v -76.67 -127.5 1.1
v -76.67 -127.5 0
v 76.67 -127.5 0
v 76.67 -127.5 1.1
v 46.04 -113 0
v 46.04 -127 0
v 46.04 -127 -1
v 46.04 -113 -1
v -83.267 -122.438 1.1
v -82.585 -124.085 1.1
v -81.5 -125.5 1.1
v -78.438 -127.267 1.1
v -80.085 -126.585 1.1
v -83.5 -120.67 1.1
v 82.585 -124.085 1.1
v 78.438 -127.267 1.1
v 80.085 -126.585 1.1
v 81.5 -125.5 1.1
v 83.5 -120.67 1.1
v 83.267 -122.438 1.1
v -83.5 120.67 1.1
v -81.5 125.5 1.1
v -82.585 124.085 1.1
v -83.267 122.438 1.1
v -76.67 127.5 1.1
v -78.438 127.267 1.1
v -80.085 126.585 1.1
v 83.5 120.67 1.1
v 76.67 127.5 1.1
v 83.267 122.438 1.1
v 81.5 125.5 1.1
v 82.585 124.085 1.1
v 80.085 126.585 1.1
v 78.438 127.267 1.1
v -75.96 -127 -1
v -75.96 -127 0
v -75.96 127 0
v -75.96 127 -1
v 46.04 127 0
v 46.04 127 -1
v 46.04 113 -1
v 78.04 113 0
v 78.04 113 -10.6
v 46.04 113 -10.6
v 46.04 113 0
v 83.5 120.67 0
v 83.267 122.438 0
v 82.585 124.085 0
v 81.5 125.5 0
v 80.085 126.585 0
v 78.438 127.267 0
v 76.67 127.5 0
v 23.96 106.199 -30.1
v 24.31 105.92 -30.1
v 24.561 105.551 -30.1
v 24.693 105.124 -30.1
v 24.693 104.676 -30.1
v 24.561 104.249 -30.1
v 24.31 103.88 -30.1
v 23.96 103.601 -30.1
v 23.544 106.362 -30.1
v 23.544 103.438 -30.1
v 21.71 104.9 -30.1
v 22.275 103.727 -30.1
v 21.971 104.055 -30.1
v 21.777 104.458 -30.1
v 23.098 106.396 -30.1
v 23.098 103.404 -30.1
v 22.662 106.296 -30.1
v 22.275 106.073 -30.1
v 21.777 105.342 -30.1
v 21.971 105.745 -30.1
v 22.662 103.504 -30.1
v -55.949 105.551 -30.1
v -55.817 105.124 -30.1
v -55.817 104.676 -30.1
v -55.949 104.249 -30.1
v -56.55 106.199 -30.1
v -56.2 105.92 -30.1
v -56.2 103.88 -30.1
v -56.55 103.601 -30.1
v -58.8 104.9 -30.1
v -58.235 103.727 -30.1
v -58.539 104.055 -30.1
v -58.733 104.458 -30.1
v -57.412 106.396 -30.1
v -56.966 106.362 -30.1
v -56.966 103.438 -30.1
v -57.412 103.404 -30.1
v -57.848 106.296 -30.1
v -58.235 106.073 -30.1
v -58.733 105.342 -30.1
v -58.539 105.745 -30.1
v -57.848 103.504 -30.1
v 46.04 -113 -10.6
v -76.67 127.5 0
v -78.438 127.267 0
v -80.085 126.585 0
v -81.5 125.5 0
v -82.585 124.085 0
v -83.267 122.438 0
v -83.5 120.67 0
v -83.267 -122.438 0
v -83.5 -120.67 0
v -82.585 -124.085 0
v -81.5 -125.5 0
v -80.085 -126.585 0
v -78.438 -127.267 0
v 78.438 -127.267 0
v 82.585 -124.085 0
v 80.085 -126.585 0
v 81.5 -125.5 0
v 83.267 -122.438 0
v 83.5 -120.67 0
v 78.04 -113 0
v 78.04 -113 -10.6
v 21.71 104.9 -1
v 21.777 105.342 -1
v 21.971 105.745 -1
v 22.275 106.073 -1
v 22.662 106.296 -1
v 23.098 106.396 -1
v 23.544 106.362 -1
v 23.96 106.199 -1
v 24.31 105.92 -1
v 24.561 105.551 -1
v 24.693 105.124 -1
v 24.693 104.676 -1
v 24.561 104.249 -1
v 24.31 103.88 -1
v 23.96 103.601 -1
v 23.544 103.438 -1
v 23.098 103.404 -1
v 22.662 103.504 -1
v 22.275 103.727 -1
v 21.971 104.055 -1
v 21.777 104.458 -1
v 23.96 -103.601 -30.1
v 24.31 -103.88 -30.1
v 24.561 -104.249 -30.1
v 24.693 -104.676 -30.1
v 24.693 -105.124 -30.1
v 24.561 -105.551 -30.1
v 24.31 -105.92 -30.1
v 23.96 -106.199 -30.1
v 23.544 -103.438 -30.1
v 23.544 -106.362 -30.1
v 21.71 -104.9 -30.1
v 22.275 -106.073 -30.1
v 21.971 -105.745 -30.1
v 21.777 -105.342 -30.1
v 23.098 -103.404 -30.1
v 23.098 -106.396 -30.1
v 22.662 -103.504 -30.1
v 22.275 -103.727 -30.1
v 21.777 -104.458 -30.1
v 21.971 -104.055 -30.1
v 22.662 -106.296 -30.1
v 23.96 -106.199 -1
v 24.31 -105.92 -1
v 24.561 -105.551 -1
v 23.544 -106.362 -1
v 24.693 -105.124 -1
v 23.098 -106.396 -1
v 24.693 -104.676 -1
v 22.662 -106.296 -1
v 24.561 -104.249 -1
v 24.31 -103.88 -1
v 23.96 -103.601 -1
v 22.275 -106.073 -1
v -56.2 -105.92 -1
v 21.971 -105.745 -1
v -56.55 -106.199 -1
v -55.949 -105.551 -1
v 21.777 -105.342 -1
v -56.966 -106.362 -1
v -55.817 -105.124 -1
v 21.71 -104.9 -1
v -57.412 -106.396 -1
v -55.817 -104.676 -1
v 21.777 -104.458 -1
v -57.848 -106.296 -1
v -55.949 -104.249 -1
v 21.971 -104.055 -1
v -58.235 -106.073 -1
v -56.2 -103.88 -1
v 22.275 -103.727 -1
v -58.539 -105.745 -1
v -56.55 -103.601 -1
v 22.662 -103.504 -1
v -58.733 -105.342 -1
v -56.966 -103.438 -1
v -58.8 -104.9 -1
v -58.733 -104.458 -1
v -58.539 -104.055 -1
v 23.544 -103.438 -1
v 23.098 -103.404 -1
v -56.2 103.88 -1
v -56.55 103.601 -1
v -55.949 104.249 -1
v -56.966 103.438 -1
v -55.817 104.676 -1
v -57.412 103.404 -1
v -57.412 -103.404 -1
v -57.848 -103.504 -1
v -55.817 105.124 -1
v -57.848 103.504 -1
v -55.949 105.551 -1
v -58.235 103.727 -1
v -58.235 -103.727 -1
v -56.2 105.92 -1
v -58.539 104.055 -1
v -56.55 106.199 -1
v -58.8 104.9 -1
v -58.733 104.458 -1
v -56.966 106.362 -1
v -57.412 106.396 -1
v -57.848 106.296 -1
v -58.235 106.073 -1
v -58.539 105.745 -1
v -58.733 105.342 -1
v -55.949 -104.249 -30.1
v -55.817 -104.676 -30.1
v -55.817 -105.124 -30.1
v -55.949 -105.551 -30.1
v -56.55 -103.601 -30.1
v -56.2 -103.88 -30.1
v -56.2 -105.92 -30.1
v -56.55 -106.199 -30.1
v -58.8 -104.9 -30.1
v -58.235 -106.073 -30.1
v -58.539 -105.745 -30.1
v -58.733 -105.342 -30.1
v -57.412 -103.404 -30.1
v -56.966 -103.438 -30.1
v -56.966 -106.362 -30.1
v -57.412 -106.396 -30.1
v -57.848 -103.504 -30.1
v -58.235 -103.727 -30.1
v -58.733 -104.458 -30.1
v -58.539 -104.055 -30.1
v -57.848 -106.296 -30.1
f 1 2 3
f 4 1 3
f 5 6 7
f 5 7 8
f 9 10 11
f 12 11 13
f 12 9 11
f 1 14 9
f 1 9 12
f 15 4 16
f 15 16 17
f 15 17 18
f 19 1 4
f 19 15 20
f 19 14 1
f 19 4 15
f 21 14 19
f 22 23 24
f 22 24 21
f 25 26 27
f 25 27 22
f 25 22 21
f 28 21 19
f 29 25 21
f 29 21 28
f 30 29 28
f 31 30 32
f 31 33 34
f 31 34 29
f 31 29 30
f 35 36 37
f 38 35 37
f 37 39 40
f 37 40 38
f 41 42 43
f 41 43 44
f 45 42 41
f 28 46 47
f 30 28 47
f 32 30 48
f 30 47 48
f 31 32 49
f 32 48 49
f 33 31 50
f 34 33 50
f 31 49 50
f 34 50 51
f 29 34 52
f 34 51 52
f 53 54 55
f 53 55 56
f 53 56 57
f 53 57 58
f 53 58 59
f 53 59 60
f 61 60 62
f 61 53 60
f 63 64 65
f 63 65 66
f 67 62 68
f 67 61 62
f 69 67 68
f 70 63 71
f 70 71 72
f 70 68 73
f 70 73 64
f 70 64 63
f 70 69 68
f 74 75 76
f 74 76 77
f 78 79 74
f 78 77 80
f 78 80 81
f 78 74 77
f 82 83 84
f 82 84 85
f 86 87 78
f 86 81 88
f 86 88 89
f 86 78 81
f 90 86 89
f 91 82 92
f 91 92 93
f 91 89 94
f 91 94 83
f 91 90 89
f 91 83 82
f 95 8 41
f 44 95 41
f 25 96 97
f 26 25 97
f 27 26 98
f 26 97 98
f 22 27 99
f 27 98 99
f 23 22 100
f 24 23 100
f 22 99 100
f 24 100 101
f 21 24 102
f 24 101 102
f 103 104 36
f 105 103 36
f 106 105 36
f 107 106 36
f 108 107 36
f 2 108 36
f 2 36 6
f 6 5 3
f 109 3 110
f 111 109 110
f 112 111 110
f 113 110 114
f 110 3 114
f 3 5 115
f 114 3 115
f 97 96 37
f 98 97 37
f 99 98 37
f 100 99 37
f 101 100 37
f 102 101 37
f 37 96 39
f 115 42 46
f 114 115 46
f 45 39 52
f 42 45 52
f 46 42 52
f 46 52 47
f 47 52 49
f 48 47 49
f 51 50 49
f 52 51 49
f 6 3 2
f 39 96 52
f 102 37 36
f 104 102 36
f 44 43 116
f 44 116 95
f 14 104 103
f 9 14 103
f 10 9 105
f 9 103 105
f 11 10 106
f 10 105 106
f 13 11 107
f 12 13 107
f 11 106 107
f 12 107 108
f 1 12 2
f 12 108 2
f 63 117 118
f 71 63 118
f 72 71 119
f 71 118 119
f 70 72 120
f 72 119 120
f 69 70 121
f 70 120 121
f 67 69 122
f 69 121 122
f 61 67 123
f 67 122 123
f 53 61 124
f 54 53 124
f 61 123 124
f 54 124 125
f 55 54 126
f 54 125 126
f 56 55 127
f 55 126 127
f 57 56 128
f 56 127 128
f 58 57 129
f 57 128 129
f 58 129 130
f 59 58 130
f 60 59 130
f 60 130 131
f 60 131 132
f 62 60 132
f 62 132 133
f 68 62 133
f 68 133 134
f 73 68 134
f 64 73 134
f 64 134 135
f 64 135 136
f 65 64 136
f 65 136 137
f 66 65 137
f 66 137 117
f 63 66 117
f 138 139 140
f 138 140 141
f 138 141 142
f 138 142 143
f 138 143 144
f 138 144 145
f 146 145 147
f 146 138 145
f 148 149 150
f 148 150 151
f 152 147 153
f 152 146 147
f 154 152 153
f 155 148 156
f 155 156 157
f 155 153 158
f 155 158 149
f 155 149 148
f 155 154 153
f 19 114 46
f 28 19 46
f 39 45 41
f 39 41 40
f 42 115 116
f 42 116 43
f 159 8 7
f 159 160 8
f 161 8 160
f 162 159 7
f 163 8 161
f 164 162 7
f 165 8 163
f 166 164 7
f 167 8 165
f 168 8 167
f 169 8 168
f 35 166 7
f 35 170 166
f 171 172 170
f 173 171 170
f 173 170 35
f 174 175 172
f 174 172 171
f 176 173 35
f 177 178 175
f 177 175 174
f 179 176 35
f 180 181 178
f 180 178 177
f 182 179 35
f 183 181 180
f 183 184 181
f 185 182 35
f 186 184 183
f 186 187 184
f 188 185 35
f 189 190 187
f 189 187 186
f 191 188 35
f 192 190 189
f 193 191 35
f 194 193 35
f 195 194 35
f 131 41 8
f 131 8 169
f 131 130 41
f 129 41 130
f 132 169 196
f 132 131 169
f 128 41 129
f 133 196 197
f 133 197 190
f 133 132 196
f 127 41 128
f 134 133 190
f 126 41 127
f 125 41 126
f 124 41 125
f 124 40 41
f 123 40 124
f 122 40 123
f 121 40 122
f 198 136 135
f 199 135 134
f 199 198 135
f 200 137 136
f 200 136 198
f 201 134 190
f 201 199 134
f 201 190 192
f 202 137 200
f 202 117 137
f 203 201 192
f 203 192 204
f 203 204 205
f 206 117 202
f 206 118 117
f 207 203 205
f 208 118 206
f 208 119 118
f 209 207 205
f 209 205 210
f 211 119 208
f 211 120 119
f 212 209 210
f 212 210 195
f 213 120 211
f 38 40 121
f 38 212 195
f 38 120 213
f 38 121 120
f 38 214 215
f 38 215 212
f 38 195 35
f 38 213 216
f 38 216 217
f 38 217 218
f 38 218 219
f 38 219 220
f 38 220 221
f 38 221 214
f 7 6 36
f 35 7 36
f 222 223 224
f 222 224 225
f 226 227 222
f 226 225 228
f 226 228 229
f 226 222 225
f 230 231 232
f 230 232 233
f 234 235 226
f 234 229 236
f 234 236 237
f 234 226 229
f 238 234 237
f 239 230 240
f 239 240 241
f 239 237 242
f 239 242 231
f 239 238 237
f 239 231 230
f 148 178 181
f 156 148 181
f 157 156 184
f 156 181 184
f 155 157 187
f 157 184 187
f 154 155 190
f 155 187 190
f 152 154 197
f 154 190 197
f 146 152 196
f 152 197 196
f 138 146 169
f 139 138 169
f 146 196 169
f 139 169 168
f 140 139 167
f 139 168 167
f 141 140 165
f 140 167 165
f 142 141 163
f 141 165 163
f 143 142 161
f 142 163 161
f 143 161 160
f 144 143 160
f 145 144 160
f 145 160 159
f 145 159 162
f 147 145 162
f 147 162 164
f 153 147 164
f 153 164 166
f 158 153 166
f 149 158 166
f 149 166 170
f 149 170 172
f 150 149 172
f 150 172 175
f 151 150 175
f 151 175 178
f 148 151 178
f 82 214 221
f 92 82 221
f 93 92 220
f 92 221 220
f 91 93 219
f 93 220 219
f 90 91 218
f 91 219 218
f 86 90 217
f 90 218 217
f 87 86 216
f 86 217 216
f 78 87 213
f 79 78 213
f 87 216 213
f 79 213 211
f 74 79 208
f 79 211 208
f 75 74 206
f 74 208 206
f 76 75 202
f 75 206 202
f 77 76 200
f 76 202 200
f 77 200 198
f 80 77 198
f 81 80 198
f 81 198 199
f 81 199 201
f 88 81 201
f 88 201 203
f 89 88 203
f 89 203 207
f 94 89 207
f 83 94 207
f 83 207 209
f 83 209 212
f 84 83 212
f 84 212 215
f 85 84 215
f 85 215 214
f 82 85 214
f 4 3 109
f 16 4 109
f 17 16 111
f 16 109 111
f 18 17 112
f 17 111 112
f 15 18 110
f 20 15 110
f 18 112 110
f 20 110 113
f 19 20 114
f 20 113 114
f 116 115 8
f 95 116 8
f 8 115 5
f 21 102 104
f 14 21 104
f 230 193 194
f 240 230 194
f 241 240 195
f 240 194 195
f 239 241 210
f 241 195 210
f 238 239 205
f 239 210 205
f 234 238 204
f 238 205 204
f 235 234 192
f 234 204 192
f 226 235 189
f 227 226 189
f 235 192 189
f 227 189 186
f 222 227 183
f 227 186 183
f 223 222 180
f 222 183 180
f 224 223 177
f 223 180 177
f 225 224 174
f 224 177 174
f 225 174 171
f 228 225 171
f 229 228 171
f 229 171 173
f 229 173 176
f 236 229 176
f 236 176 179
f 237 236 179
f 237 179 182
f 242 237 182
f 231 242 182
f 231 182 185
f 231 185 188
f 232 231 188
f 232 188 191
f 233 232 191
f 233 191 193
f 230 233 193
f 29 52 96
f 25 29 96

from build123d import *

# Parameters (mm, degrees)
BOSS_EXTRUDE1_DEPTH = 1.1
SKETCH3_W           = 122
SKETCH3_H           = 254
BOSS_EXTRUDE2_DEPTH = 1
SKETCH4_W           = 32
SKETCH4_H           = 226
BOSS_EXTRUDE3_DEPTH = 10.6
SKETCH5_R           = 1.5
BOSS_EXTRUDE4_DEPTH = 30.1


with BuildPart() as part:
    # Sketch2 → Boss-Extrude1 (new body)
    with BuildSketch(Plane.XY):
        with BuildLine():
            Line((-76.67, -127.5), (76.67, -127.5))
            ThreePointArc((76.67, -127.5), (81.499539316, -125.499539316), (83.5, -120.67))
            Line((83.5, -120.67), (83.5, 120.67))
            ThreePointArc((83.5, 120.67), (81.499539316, 125.499539316), (76.67, 127.5))
            Line((76.67, 127.5), (-76.67, 127.5))
            ThreePointArc((-76.67, 127.5), (-81.499539316, 125.499539316), (-83.5, 120.67))
            Line((-83.5, 120.67), (-83.5, -120.67))
            ThreePointArc((-83.5, -120.67), (-81.499539316, -125.499539316), (-76.67, -127.5))
        make_face()
    extrude(amount=BOSS_EXTRUDE1_DEPTH)

    # Sketch3 → Boss-Extrude2 (add)
    with BuildSketch(Plane(origin=(0, 0, 0), x_dir=(-1, 0, 0), z_dir=(0, 0, -1))):
        with Locations((14.96, 0)):
            Rectangle(SKETCH3_W, SKETCH3_H)
    extrude(amount=BOSS_EXTRUDE2_DEPTH)

    # Sketch4 → Boss-Extrude3 (add)
    with BuildSketch(Plane(origin=(0, 0, 0), x_dir=(-1, 0, 0), z_dir=(0, 0, -1))):
        with Locations((-62.04, 0)):
            Rectangle(SKETCH4_W, SKETCH4_H)
    extrude(amount=BOSS_EXTRUDE3_DEPTH)

    # Sketch5 → Boss-Extrude4 (add)
    with BuildSketch(Plane(origin=(0, 0, 0), x_dir=(-1, 0, 0), z_dir=(0, 0, -1))):
        with Locations((-23.21, -104.9)):
            Circle(SKETCH5_R)
        with Locations((57.3, -104.9)):
            Circle(SKETCH5_R)
        with Locations((57.3, 104.9)):
            Circle(SKETCH5_R)
        with Locations((-23.21, 104.9)):
            Circle(SKETCH5_R)
    extrude(amount=BOSS_EXTRUDE4_DEPTH)


solid = part.part
